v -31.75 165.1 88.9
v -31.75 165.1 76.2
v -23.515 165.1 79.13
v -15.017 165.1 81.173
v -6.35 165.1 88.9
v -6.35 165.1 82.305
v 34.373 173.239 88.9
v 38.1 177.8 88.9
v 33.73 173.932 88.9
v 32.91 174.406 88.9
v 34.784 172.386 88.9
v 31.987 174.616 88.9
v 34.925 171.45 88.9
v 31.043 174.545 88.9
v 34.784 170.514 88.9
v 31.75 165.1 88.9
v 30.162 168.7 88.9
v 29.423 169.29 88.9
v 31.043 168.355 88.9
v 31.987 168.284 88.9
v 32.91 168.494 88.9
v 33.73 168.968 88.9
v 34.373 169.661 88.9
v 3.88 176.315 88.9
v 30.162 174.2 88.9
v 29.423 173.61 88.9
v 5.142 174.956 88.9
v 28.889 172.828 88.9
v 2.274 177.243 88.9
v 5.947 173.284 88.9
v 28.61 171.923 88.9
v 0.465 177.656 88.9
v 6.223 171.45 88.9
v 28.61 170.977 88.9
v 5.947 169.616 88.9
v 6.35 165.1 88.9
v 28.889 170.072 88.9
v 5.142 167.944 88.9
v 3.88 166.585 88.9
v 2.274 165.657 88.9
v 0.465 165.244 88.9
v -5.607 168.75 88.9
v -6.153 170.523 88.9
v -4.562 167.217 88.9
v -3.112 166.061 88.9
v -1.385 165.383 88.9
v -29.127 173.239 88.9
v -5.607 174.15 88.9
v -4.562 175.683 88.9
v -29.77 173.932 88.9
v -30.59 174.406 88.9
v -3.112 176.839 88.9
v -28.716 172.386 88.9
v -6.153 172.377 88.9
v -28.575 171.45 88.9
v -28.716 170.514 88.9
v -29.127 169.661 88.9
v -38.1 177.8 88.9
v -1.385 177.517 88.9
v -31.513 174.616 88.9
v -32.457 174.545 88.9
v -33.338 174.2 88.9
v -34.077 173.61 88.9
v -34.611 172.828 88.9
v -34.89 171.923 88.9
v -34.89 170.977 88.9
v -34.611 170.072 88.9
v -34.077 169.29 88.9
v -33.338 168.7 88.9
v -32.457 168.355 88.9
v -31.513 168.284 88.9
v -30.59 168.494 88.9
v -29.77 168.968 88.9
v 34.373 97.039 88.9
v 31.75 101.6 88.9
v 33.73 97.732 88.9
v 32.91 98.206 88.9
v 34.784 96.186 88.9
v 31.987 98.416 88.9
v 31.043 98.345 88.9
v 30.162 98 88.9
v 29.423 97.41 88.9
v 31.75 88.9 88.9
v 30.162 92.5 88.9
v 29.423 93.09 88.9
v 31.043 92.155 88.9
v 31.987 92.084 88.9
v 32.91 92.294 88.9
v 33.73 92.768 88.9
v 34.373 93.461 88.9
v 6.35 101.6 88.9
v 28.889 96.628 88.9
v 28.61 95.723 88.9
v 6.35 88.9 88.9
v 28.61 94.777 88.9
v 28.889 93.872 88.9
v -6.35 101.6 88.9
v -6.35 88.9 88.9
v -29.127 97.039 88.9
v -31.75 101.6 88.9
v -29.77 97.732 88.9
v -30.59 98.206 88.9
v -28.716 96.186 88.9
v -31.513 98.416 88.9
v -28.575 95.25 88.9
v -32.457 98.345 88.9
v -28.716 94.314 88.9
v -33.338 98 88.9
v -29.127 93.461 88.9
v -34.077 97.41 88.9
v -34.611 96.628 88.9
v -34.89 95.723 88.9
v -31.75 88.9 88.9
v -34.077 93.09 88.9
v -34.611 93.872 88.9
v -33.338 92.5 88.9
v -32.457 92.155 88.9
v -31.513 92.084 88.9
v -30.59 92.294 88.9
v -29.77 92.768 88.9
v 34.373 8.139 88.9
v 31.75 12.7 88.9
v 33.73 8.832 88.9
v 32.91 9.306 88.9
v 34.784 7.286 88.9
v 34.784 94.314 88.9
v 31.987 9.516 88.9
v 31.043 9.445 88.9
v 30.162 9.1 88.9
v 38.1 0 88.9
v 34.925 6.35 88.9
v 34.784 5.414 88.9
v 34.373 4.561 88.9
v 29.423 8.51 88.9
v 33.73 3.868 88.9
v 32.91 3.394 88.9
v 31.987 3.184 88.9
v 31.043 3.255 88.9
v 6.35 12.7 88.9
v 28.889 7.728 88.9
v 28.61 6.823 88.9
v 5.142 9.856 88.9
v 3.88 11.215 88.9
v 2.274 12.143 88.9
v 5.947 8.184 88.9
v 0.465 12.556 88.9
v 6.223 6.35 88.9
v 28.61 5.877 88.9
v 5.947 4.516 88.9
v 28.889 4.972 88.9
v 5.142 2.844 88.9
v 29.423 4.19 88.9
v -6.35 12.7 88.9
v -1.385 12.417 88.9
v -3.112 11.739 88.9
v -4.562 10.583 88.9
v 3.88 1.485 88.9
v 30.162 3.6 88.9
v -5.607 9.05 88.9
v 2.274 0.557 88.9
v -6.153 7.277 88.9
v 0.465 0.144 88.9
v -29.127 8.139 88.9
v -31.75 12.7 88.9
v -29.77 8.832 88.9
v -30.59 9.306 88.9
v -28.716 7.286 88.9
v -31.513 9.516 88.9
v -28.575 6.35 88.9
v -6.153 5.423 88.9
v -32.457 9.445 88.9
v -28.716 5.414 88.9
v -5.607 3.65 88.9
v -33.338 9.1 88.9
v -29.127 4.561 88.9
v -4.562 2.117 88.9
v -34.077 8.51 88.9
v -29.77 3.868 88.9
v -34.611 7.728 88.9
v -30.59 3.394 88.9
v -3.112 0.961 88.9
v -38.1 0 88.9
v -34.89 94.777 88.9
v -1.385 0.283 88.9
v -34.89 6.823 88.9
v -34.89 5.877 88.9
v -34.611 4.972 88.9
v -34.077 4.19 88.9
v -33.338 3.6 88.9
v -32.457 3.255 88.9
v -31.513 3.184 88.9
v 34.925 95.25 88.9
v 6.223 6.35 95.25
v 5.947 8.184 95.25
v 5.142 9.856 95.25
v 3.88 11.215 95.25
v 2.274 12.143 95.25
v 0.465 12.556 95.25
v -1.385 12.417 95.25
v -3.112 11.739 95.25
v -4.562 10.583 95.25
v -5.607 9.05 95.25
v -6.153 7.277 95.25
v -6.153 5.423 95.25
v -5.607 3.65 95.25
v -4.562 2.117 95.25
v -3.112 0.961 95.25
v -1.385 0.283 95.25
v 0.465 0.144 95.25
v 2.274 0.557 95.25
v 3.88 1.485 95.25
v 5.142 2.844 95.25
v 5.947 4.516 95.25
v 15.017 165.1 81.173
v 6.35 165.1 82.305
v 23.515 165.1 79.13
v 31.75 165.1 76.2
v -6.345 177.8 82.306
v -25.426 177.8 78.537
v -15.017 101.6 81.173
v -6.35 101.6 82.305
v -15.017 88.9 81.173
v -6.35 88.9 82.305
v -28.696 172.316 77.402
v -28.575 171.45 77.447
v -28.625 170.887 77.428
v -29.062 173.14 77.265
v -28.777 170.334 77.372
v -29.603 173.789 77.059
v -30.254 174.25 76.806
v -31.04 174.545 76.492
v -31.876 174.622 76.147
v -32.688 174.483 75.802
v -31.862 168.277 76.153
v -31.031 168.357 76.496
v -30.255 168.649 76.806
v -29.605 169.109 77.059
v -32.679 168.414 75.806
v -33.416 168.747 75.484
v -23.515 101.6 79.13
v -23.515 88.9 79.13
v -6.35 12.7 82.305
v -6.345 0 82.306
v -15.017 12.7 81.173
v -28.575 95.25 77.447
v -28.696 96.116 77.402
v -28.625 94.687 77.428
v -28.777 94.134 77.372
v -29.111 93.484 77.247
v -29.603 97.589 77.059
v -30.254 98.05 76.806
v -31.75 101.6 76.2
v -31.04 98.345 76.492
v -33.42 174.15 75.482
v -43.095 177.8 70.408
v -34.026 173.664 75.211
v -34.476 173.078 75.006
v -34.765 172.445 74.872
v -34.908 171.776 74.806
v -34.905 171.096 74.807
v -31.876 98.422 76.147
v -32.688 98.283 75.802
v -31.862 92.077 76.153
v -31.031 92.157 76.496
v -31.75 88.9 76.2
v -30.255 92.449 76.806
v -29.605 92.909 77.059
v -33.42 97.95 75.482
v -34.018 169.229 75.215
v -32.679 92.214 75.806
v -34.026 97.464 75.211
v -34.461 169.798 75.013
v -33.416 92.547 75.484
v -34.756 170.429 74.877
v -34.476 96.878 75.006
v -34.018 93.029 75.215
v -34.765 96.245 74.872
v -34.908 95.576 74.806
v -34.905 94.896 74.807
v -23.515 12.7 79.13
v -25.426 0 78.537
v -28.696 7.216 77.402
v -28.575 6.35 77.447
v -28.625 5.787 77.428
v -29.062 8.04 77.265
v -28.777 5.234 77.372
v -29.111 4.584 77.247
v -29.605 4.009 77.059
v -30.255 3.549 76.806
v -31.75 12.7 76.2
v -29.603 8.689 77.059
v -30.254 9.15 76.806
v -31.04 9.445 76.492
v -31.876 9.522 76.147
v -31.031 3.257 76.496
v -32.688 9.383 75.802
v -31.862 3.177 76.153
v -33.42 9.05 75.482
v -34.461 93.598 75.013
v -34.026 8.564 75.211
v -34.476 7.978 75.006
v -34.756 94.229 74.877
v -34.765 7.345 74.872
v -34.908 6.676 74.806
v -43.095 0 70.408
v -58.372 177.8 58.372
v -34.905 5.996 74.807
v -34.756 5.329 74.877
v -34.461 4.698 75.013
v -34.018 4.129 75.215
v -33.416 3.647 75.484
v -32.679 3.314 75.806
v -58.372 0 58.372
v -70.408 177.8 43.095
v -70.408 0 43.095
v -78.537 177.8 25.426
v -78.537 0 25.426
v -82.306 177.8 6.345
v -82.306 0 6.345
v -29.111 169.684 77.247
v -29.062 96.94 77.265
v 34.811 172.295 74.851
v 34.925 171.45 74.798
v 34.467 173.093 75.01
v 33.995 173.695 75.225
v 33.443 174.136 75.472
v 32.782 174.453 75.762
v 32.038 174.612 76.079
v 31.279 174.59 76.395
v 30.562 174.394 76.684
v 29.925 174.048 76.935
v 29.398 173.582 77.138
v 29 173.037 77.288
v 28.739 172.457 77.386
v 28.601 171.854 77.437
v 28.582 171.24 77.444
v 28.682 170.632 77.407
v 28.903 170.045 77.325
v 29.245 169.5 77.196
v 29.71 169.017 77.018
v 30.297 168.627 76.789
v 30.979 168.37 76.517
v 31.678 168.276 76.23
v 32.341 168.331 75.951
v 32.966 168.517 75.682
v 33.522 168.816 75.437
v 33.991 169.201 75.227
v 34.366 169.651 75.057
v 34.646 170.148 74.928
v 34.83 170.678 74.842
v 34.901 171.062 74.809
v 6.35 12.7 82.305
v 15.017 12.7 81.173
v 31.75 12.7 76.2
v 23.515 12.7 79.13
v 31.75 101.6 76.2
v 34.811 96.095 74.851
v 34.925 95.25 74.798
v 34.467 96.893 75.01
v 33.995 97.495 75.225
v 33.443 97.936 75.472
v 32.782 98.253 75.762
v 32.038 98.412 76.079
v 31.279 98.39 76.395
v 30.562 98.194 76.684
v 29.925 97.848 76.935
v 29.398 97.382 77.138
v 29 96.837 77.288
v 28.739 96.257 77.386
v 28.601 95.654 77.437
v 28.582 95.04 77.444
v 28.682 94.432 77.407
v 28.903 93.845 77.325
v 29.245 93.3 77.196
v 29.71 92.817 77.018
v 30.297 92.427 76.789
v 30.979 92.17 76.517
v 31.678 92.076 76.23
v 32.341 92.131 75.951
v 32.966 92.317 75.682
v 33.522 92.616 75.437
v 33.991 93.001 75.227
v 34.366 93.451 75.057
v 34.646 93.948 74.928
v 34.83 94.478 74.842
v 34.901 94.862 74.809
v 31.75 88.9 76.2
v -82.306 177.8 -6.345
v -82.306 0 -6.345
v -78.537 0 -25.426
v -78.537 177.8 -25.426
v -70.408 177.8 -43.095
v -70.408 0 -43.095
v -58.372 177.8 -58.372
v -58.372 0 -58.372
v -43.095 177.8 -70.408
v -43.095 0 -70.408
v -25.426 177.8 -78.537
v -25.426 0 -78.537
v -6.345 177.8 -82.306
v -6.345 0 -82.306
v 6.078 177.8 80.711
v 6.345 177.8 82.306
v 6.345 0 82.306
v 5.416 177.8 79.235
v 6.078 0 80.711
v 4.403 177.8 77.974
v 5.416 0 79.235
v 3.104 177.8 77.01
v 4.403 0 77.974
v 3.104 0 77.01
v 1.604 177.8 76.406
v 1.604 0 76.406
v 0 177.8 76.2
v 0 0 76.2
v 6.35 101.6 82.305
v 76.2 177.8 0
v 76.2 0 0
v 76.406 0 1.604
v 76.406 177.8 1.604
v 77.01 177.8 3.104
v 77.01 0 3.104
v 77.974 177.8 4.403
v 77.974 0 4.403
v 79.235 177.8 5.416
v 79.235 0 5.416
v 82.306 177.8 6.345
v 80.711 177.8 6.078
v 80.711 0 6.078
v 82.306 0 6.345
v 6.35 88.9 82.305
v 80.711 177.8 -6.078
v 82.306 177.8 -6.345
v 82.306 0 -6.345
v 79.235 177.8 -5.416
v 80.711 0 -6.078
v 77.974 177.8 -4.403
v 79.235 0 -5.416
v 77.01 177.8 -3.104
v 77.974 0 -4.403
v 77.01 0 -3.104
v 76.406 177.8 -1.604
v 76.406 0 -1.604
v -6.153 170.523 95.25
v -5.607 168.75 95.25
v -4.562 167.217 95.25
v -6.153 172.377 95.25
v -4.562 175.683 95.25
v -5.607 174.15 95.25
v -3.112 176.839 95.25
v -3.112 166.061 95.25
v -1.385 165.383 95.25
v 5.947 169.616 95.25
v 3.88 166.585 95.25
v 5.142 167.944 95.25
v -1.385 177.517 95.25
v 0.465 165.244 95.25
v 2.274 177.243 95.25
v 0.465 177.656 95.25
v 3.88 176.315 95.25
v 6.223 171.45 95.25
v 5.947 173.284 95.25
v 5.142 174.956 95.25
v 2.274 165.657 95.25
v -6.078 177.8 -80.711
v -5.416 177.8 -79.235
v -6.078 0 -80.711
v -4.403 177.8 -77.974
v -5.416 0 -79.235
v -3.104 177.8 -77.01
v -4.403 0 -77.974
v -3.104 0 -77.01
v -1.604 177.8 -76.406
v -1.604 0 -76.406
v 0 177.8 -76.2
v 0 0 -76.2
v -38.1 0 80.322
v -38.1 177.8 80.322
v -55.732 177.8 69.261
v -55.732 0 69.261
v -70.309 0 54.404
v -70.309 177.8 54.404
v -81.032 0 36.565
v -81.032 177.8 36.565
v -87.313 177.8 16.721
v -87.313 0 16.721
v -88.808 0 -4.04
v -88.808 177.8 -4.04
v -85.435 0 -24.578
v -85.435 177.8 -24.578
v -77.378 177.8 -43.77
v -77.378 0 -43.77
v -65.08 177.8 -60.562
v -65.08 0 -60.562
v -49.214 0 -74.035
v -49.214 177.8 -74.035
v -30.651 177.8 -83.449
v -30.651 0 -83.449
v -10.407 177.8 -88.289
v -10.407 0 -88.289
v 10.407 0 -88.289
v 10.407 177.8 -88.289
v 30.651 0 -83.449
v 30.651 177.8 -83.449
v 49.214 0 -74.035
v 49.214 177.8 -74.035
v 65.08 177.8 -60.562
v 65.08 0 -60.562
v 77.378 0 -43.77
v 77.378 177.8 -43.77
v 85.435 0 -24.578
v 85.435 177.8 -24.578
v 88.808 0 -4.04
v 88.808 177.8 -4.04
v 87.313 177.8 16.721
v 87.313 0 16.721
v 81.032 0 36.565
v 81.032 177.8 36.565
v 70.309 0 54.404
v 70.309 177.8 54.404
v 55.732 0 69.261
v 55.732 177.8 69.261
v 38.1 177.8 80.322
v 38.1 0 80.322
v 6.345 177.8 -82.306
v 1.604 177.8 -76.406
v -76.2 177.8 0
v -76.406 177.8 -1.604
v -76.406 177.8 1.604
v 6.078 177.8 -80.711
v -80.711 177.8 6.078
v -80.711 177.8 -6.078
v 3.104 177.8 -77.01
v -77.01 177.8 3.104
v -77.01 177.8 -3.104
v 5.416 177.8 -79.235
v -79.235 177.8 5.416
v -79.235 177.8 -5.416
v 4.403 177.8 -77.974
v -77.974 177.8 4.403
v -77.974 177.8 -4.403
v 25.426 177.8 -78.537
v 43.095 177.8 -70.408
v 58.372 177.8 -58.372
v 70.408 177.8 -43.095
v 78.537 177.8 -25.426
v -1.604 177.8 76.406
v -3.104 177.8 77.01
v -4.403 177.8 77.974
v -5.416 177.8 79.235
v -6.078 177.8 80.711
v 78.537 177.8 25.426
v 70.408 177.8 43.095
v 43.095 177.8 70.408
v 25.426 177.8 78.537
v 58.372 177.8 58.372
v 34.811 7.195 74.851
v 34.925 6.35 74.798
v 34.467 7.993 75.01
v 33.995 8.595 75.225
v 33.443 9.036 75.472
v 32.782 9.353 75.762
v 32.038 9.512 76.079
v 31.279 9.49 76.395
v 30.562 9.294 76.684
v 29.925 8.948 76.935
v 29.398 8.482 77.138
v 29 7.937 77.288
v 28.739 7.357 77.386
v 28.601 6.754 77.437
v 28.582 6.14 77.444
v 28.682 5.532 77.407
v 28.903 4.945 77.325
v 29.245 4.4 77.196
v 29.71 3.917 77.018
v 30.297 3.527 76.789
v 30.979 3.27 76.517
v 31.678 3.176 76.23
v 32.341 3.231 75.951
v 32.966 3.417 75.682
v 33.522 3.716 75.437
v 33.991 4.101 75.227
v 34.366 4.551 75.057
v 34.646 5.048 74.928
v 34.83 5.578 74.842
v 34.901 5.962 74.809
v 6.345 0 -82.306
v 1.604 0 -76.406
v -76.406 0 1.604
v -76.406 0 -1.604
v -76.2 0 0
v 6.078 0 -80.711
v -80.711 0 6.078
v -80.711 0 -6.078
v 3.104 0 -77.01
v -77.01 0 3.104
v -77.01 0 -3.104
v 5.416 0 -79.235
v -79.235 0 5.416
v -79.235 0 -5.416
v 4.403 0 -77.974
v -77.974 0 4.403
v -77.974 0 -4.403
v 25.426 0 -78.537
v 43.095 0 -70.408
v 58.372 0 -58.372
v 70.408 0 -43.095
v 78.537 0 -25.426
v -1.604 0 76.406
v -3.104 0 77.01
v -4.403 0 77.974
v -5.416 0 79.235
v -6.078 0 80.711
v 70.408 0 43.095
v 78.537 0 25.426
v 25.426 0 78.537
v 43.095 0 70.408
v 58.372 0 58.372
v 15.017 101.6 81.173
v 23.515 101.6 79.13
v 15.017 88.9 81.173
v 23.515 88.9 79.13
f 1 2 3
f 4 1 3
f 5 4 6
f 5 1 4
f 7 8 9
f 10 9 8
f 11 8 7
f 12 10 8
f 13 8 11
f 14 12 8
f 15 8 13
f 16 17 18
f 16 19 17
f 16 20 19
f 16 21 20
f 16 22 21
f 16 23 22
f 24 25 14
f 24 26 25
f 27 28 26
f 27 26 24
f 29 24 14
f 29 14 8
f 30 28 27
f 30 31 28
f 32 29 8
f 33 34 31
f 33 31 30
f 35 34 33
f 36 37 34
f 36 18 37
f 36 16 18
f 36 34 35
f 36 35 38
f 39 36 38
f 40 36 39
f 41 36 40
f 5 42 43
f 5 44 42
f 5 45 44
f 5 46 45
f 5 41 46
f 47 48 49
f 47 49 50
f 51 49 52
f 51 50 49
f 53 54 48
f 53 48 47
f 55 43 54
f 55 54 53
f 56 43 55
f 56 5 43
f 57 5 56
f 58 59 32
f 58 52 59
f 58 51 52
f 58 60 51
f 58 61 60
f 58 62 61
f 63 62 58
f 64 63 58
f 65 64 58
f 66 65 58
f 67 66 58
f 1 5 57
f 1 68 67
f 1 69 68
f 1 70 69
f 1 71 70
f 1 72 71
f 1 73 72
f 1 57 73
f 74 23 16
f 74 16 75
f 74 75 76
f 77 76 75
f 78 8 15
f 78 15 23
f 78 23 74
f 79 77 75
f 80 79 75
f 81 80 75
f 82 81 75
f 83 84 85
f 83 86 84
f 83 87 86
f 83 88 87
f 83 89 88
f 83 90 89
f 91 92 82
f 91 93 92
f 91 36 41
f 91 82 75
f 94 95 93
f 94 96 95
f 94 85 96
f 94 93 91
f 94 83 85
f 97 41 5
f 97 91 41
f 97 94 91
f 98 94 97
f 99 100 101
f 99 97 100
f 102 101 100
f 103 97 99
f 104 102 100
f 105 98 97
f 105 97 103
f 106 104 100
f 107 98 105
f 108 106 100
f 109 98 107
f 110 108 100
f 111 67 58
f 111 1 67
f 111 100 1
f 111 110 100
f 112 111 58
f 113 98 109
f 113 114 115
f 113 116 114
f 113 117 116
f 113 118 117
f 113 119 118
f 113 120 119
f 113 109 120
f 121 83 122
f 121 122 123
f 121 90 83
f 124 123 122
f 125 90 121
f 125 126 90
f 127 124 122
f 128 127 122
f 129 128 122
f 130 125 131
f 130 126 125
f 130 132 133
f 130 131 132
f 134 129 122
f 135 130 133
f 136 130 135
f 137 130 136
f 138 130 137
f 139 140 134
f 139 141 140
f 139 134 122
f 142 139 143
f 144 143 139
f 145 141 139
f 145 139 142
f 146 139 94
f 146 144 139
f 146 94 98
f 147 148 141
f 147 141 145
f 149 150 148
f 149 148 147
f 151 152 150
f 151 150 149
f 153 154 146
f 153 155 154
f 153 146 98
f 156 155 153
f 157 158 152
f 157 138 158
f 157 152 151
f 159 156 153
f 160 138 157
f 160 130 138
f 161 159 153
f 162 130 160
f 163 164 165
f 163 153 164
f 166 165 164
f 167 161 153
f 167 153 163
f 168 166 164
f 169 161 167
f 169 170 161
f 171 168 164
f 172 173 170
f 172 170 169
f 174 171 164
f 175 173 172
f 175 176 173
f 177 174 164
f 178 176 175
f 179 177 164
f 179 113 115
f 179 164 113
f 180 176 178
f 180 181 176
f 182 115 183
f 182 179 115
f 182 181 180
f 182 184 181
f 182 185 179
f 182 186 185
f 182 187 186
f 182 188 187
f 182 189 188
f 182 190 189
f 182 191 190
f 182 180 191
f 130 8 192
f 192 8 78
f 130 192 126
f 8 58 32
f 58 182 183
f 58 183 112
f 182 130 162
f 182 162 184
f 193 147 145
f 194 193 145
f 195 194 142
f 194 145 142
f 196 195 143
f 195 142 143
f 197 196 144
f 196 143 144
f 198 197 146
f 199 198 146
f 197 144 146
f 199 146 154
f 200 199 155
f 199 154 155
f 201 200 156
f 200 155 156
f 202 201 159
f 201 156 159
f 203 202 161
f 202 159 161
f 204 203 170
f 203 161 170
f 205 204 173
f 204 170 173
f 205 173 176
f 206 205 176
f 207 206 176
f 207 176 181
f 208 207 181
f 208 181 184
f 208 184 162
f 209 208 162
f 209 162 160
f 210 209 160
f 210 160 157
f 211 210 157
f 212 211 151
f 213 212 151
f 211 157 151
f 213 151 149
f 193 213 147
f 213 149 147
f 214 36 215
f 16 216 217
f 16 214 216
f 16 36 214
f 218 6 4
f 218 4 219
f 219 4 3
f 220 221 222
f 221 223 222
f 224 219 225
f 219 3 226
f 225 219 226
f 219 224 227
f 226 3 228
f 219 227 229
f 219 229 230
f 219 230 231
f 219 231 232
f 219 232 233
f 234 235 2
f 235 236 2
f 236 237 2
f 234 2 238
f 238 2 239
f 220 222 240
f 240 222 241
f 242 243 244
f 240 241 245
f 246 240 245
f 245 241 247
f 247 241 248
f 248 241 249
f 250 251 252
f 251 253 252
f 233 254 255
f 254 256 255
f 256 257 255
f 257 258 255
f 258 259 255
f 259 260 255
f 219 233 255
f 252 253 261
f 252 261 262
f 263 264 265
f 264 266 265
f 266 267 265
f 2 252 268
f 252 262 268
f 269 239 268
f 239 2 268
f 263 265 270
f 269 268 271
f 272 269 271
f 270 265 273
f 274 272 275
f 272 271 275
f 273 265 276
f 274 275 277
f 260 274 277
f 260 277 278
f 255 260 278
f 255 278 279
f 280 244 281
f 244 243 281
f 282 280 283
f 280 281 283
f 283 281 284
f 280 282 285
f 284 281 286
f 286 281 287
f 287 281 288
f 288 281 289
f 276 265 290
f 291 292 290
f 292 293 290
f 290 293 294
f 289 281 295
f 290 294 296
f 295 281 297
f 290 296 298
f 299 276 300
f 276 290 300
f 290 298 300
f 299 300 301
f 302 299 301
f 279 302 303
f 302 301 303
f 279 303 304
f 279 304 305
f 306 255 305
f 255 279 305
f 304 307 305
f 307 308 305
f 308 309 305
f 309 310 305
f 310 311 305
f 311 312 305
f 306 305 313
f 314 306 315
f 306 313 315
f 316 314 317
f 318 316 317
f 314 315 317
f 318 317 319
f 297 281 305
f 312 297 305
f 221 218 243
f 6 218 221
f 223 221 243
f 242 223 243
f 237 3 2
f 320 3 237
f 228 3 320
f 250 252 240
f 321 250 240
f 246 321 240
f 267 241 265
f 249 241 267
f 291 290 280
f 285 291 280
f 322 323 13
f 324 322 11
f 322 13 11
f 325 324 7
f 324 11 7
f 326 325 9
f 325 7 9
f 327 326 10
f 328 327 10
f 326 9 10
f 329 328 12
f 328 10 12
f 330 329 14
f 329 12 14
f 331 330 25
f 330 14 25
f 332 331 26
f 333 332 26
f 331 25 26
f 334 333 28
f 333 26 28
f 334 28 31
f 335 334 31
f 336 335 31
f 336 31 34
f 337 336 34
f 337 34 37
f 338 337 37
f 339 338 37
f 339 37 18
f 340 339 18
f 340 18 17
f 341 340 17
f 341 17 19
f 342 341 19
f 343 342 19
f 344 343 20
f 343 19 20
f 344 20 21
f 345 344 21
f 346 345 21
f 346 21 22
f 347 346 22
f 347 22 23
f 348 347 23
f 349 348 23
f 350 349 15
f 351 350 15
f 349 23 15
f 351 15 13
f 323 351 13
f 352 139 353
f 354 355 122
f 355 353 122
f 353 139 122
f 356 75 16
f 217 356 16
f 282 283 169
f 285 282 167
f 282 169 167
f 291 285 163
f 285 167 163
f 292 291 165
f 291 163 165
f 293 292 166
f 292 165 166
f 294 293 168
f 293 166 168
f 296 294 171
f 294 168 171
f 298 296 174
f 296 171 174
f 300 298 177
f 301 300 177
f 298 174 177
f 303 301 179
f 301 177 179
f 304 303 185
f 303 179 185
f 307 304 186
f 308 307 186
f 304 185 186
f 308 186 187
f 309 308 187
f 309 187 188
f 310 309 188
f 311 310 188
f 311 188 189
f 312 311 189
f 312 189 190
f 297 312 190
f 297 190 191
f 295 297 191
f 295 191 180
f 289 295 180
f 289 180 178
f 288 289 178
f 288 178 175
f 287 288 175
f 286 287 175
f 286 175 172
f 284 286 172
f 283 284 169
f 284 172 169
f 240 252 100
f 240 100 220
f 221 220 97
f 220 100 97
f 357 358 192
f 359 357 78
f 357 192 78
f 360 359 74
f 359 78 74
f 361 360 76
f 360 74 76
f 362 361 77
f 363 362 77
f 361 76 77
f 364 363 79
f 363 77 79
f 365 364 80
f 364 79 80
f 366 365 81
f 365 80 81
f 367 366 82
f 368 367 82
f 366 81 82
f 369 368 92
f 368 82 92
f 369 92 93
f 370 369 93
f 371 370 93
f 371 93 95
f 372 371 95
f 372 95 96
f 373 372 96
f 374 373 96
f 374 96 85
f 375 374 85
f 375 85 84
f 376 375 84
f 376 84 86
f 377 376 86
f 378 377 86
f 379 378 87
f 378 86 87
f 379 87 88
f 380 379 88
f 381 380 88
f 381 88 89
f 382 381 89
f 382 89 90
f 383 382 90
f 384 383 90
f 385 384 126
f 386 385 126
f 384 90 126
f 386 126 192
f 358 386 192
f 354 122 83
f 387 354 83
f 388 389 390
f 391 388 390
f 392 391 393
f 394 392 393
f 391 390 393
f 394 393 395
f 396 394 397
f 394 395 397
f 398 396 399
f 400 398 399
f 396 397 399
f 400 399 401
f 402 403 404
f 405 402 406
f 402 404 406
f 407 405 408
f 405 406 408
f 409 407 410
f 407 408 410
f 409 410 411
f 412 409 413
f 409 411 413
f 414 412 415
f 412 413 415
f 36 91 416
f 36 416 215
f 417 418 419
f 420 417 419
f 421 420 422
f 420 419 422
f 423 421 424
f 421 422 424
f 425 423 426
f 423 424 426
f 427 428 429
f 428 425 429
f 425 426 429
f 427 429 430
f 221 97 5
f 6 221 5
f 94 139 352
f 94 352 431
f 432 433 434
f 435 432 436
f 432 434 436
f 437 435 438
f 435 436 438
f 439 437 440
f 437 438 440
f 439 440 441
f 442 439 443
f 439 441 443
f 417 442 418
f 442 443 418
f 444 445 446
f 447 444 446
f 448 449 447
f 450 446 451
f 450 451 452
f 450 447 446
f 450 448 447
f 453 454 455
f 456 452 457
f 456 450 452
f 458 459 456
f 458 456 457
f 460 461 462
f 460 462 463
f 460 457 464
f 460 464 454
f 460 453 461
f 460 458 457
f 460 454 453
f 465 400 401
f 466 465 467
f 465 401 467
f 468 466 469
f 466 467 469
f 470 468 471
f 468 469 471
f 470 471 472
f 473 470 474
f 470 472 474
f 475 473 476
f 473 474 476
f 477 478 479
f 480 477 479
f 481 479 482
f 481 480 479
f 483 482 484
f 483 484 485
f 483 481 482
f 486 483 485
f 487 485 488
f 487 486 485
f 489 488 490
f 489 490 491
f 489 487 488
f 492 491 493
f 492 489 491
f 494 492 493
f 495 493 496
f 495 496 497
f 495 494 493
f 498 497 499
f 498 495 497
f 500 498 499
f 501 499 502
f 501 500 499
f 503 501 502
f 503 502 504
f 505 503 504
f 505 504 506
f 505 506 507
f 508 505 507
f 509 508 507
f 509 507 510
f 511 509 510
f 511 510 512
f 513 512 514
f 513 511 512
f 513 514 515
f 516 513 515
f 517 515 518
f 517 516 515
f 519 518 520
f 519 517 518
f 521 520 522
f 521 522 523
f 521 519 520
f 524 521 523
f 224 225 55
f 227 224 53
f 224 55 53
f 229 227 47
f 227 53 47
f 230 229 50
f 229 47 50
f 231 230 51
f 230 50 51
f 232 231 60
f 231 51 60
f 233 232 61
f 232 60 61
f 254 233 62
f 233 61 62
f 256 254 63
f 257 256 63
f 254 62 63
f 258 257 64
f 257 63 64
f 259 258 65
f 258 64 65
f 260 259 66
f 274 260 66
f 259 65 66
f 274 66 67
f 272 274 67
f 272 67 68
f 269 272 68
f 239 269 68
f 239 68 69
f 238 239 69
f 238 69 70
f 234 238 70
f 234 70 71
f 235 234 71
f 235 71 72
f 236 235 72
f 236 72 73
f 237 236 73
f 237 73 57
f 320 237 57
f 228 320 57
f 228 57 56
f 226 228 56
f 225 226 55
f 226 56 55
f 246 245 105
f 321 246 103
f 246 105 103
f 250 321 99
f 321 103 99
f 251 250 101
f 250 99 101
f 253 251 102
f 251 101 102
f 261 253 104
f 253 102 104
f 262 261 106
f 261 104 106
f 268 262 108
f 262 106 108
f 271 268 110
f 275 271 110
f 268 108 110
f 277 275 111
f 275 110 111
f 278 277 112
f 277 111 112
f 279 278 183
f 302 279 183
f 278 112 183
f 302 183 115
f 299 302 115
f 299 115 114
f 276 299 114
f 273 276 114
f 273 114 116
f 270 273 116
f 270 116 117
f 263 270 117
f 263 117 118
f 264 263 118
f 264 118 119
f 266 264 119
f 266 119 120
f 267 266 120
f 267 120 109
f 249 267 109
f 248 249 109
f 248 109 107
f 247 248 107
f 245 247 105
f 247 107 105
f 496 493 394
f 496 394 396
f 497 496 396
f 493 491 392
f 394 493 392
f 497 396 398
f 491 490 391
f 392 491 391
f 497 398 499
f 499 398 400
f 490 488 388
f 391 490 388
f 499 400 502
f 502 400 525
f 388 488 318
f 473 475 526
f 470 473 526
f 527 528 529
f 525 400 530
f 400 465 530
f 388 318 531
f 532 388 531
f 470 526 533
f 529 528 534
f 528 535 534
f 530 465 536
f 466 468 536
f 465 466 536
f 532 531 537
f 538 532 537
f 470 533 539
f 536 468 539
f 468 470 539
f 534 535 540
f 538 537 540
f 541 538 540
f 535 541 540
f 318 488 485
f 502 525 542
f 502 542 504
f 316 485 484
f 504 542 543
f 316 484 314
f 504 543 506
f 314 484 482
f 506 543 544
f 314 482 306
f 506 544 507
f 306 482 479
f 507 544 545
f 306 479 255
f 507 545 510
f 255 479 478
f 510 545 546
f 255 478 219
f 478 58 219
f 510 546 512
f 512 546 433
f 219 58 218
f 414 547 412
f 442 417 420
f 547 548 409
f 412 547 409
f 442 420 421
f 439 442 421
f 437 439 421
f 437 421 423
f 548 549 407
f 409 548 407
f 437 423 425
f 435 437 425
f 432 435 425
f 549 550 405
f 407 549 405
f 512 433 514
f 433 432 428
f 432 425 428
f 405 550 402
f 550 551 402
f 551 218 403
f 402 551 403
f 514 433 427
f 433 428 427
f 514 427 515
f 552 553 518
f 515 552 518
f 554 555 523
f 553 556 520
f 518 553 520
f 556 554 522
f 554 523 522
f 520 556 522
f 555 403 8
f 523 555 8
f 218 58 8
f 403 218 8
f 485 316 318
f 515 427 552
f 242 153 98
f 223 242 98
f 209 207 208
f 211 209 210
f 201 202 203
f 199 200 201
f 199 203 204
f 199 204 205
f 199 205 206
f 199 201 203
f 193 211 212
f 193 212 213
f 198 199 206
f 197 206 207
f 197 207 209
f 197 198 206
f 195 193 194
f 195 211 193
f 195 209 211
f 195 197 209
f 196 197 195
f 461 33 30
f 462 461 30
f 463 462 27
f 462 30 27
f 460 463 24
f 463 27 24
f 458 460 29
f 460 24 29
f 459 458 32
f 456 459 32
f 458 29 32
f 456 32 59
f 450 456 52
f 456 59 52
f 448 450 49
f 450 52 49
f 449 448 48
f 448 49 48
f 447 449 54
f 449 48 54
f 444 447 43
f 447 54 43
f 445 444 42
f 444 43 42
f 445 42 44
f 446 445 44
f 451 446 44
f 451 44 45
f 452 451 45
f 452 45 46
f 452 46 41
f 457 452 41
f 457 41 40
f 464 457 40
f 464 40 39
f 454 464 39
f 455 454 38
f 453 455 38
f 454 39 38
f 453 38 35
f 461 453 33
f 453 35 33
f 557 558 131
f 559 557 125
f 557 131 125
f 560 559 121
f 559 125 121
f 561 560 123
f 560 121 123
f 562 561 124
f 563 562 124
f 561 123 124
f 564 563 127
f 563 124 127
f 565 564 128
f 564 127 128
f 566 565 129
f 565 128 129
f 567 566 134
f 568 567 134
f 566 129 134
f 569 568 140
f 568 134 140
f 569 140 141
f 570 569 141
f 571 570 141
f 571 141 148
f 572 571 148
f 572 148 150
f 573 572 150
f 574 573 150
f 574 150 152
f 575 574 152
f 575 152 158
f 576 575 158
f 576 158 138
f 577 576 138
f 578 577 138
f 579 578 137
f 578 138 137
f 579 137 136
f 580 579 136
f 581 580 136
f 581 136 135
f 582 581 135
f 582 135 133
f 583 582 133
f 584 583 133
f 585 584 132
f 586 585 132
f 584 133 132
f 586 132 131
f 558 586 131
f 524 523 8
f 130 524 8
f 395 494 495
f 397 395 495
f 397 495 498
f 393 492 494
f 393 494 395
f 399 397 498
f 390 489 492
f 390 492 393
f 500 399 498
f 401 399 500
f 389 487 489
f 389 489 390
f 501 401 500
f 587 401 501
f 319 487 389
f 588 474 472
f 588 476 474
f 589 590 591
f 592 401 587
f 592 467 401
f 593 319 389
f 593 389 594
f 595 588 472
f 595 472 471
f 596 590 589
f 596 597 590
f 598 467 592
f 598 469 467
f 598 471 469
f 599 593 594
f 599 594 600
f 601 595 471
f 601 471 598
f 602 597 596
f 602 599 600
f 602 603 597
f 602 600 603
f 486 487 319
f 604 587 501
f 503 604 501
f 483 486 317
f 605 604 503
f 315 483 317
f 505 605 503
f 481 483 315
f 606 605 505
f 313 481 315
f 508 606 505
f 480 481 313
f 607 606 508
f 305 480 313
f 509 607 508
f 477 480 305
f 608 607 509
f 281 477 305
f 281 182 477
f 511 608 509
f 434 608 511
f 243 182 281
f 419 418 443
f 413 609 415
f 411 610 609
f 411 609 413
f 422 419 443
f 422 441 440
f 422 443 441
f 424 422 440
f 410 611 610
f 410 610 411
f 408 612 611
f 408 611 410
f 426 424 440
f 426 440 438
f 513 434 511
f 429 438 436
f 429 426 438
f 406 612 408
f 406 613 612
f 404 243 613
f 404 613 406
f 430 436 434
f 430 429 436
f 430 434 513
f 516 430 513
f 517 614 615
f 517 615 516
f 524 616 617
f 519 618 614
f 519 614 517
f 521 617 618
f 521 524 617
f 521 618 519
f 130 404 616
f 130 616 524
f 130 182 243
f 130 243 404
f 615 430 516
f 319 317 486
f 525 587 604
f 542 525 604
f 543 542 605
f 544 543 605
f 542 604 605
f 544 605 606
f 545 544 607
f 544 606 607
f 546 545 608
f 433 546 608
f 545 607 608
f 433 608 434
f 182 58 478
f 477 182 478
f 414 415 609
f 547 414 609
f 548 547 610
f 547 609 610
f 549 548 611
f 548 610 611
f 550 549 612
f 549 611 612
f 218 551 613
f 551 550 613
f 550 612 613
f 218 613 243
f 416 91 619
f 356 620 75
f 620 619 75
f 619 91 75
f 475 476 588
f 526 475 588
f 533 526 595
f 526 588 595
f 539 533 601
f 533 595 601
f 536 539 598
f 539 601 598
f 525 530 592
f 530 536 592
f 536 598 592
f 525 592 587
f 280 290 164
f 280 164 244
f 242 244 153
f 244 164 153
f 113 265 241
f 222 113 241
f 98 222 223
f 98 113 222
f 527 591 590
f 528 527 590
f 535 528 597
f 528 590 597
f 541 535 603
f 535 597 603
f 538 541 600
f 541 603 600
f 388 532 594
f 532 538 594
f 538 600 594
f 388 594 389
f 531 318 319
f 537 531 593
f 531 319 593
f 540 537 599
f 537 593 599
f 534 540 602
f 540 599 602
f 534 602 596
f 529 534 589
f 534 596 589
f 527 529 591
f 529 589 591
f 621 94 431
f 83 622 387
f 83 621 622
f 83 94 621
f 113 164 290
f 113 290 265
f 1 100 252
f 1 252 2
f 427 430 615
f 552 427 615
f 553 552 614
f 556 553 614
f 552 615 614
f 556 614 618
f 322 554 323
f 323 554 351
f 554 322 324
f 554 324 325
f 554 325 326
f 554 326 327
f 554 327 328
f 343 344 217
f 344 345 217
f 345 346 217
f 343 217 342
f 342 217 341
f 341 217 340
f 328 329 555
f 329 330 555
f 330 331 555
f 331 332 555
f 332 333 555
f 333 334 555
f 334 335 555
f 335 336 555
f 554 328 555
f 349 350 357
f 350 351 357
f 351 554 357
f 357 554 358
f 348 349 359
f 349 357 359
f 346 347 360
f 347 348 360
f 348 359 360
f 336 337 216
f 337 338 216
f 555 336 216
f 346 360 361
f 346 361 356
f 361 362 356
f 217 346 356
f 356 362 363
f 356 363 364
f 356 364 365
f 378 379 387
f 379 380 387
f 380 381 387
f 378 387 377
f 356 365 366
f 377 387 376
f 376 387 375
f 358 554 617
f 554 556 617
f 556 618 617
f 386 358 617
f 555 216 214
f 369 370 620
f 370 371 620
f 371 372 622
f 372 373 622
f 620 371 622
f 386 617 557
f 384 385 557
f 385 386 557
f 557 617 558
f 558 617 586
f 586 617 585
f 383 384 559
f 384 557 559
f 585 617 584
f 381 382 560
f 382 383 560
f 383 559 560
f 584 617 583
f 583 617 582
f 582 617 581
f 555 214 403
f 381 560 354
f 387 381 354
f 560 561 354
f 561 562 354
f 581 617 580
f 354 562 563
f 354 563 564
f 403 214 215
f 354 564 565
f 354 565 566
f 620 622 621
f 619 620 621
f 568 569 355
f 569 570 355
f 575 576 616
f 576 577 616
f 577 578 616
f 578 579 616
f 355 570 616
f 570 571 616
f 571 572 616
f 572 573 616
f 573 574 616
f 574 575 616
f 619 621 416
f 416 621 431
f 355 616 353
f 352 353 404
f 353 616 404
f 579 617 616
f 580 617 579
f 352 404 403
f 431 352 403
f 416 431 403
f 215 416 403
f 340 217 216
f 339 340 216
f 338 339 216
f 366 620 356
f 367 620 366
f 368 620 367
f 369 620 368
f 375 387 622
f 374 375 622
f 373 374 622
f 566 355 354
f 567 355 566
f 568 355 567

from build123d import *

# Parameters (mm, degrees)
F1_DEPTH = 177.8
F4_DEPTH = 177.801
F5_W     = 25.4
F5_H     = 76.2
F5_H_2   = 63.5
F6_DEPTH = 25.4
F7_R     = 3.175
F8_DEPTH = 25.4
F7_R_2   = 6.223
F9_DEPTH = 6.35


# Not quite as in the source:
# - a feature names something its author has since deleted; it is built from what else it names


with BuildPart() as f1:
    # F0 (on Front) → F1 (new body)
    with BuildSketch(Plane.XZ):
        with BuildLine():
            ThreePointArc((-38.1, 80.3218525683), (-47.519048812, -75.1342132454), (88.9, 0))
            ThreePointArc((88.9, 0), (75.1342132454, 47.519048812), (38.1, 80.3218525683))
            ThreePointArc((38.1, 80.3218525683), (19.5268700344, 86.7289533354), (0, 88.9))
            ThreePointArc((0, 88.9), (-19.5268700344, 86.7289533354), (-38.1, 80.3218525683))
        make_face()
        with BuildLine():
            ThreePointArc((0, 88.9), (19.5268700344, 86.7289533354), (38.1, 80.3218525683))
            Line((38.1, 80.3218525683), (38.1, 88.9))
            Line((38.1, 88.9), (0, 88.9))
        make_face()
        with BuildLine():
            Line((-38.1, 88.9), (-38.1, 80.3218525683))
            ThreePointArc((-38.1, 80.3218525683), (-19.5268700344, 86.7289533354), (0, 88.9))
            Line((0, 88.9), (-38.1, 88.9))
        make_face()
    extrude(amount=-F1_DEPTH)

    # F3 (on face) → F4 (cut, through all)
    with BuildSketch(Plane.XZ):
        with BuildLine():
            Line((-76.2, 0), (0, 0))
            Line((0, 0), (0, 76.2))
            ThreePointArc((0, 76.2), (-4.4029328075, 77.974338005), (-6.3453015162, 82.3057692308))
            ThreePointArc((-6.3453015162, 82.3057692308), (-58.3716647869, 58.3716647869), (-82.3057692308, 6.3453015162))
            ThreePointArc((-82.3057692308, 6.3453015162), (-77.974338005, 4.4029328075), (-76.2, 0))
        make_face()
        with BuildLine():
            Line((0, -76.2), (0, 0))
            Line((0, 0), (-76.2, 0))
            ThreePointArc((-76.2, 0), (-77.974338005, -4.4029328075), (-82.3057692308, -6.3453015162))
            ThreePointArc((-82.3057692308, -6.3453015162), (-58.3716647869, -58.3716647869), (-6.3453015162, -82.3057692308))
            ThreePointArc((-6.3453015162, -82.3057692308), (-4.4029328075, -77.974338005), (0, -76.2))
        make_face()
        with BuildLine():
            Line((0, 76.2), (0, 0))
            Line((0, 0), (76.2, 0))
            ThreePointArc((76.2, 0), (77.974338005, 4.4029328075), (82.3057692308, 6.3453015162))
            ThreePointArc((82.3057692308, 6.3453015162), (58.3716647869, 58.3716647869), (6.3453015162, 82.3057692308))
            ThreePointArc((6.3453015162, 82.3057692308), (4.4029328075, 77.974338005), (0, 76.2))
        make_face()
        with BuildLine():
            Line((76.2, 0), (0, 0))
            Line((0, 0), (0, -76.2))
            ThreePointArc((0, -76.2), (4.4029328075, -77.974338005), (6.3453015162, -82.3057692308))
            ThreePointArc((6.3453015162, -82.3057692308), (58.3716647869, -58.3716647869), (82.3057692308, -6.3453015162))
            ThreePointArc((82.3057692308, -6.3453015162), (77.974338005, -4.4029328075), (76.2, 0))
        make_face()
    extrude(amount=-F4_DEPTH, mode=Mode.SUBTRACT)

    # F5 (on face) → F6 (cut)
    with BuildSketch(Plane.XY.offset(88.9)):
        with Locations((-19.05, 50.8)):
            Rectangle(F5_W, F5_H)
        with Locations((19.05, 50.8)):
            Rectangle(F5_W, F5_H)
        with Locations((19.05, 133.35)):
            Rectangle(F5_W, F5_H_2)
        with Locations((-19.05, 133.35)):
            Rectangle(F5_W, F5_H_2)
    extrude(amount=-F6_DEPTH, mode=Mode.SUBTRACT)

    # F7 (on face) → F8 (cut)
    with BuildSketch(Plane.XY.offset(88.9)):
        with Locations((-31.75, 95.25)):
            Circle(F7_R)
        with Locations((-31.75, 171.45)):
            Circle(F7_R)
        with Locations((31.75, 171.45)):
            Circle(F7_R)
        with Locations((31.75, 95.25)):
            Circle(F7_R)
        with Locations((31.75, 6.35)):
            Circle(F7_R)
        with Locations((-31.75, 6.35)):
            Circle(F7_R)
    extrude(amount=-F8_DEPTH, mode=Mode.SUBTRACT)

    # F7 (on face) → F9 (join)
    with BuildSketch(Plane.XY.offset(88.9)):
        with Locations((0, 171.45)):
            Circle(F7_R_2)
        with Locations((0, 6.35)):
            Circle(F7_R_2)
    extrude(amount=F9_DEPTH)


solid = f1.part
